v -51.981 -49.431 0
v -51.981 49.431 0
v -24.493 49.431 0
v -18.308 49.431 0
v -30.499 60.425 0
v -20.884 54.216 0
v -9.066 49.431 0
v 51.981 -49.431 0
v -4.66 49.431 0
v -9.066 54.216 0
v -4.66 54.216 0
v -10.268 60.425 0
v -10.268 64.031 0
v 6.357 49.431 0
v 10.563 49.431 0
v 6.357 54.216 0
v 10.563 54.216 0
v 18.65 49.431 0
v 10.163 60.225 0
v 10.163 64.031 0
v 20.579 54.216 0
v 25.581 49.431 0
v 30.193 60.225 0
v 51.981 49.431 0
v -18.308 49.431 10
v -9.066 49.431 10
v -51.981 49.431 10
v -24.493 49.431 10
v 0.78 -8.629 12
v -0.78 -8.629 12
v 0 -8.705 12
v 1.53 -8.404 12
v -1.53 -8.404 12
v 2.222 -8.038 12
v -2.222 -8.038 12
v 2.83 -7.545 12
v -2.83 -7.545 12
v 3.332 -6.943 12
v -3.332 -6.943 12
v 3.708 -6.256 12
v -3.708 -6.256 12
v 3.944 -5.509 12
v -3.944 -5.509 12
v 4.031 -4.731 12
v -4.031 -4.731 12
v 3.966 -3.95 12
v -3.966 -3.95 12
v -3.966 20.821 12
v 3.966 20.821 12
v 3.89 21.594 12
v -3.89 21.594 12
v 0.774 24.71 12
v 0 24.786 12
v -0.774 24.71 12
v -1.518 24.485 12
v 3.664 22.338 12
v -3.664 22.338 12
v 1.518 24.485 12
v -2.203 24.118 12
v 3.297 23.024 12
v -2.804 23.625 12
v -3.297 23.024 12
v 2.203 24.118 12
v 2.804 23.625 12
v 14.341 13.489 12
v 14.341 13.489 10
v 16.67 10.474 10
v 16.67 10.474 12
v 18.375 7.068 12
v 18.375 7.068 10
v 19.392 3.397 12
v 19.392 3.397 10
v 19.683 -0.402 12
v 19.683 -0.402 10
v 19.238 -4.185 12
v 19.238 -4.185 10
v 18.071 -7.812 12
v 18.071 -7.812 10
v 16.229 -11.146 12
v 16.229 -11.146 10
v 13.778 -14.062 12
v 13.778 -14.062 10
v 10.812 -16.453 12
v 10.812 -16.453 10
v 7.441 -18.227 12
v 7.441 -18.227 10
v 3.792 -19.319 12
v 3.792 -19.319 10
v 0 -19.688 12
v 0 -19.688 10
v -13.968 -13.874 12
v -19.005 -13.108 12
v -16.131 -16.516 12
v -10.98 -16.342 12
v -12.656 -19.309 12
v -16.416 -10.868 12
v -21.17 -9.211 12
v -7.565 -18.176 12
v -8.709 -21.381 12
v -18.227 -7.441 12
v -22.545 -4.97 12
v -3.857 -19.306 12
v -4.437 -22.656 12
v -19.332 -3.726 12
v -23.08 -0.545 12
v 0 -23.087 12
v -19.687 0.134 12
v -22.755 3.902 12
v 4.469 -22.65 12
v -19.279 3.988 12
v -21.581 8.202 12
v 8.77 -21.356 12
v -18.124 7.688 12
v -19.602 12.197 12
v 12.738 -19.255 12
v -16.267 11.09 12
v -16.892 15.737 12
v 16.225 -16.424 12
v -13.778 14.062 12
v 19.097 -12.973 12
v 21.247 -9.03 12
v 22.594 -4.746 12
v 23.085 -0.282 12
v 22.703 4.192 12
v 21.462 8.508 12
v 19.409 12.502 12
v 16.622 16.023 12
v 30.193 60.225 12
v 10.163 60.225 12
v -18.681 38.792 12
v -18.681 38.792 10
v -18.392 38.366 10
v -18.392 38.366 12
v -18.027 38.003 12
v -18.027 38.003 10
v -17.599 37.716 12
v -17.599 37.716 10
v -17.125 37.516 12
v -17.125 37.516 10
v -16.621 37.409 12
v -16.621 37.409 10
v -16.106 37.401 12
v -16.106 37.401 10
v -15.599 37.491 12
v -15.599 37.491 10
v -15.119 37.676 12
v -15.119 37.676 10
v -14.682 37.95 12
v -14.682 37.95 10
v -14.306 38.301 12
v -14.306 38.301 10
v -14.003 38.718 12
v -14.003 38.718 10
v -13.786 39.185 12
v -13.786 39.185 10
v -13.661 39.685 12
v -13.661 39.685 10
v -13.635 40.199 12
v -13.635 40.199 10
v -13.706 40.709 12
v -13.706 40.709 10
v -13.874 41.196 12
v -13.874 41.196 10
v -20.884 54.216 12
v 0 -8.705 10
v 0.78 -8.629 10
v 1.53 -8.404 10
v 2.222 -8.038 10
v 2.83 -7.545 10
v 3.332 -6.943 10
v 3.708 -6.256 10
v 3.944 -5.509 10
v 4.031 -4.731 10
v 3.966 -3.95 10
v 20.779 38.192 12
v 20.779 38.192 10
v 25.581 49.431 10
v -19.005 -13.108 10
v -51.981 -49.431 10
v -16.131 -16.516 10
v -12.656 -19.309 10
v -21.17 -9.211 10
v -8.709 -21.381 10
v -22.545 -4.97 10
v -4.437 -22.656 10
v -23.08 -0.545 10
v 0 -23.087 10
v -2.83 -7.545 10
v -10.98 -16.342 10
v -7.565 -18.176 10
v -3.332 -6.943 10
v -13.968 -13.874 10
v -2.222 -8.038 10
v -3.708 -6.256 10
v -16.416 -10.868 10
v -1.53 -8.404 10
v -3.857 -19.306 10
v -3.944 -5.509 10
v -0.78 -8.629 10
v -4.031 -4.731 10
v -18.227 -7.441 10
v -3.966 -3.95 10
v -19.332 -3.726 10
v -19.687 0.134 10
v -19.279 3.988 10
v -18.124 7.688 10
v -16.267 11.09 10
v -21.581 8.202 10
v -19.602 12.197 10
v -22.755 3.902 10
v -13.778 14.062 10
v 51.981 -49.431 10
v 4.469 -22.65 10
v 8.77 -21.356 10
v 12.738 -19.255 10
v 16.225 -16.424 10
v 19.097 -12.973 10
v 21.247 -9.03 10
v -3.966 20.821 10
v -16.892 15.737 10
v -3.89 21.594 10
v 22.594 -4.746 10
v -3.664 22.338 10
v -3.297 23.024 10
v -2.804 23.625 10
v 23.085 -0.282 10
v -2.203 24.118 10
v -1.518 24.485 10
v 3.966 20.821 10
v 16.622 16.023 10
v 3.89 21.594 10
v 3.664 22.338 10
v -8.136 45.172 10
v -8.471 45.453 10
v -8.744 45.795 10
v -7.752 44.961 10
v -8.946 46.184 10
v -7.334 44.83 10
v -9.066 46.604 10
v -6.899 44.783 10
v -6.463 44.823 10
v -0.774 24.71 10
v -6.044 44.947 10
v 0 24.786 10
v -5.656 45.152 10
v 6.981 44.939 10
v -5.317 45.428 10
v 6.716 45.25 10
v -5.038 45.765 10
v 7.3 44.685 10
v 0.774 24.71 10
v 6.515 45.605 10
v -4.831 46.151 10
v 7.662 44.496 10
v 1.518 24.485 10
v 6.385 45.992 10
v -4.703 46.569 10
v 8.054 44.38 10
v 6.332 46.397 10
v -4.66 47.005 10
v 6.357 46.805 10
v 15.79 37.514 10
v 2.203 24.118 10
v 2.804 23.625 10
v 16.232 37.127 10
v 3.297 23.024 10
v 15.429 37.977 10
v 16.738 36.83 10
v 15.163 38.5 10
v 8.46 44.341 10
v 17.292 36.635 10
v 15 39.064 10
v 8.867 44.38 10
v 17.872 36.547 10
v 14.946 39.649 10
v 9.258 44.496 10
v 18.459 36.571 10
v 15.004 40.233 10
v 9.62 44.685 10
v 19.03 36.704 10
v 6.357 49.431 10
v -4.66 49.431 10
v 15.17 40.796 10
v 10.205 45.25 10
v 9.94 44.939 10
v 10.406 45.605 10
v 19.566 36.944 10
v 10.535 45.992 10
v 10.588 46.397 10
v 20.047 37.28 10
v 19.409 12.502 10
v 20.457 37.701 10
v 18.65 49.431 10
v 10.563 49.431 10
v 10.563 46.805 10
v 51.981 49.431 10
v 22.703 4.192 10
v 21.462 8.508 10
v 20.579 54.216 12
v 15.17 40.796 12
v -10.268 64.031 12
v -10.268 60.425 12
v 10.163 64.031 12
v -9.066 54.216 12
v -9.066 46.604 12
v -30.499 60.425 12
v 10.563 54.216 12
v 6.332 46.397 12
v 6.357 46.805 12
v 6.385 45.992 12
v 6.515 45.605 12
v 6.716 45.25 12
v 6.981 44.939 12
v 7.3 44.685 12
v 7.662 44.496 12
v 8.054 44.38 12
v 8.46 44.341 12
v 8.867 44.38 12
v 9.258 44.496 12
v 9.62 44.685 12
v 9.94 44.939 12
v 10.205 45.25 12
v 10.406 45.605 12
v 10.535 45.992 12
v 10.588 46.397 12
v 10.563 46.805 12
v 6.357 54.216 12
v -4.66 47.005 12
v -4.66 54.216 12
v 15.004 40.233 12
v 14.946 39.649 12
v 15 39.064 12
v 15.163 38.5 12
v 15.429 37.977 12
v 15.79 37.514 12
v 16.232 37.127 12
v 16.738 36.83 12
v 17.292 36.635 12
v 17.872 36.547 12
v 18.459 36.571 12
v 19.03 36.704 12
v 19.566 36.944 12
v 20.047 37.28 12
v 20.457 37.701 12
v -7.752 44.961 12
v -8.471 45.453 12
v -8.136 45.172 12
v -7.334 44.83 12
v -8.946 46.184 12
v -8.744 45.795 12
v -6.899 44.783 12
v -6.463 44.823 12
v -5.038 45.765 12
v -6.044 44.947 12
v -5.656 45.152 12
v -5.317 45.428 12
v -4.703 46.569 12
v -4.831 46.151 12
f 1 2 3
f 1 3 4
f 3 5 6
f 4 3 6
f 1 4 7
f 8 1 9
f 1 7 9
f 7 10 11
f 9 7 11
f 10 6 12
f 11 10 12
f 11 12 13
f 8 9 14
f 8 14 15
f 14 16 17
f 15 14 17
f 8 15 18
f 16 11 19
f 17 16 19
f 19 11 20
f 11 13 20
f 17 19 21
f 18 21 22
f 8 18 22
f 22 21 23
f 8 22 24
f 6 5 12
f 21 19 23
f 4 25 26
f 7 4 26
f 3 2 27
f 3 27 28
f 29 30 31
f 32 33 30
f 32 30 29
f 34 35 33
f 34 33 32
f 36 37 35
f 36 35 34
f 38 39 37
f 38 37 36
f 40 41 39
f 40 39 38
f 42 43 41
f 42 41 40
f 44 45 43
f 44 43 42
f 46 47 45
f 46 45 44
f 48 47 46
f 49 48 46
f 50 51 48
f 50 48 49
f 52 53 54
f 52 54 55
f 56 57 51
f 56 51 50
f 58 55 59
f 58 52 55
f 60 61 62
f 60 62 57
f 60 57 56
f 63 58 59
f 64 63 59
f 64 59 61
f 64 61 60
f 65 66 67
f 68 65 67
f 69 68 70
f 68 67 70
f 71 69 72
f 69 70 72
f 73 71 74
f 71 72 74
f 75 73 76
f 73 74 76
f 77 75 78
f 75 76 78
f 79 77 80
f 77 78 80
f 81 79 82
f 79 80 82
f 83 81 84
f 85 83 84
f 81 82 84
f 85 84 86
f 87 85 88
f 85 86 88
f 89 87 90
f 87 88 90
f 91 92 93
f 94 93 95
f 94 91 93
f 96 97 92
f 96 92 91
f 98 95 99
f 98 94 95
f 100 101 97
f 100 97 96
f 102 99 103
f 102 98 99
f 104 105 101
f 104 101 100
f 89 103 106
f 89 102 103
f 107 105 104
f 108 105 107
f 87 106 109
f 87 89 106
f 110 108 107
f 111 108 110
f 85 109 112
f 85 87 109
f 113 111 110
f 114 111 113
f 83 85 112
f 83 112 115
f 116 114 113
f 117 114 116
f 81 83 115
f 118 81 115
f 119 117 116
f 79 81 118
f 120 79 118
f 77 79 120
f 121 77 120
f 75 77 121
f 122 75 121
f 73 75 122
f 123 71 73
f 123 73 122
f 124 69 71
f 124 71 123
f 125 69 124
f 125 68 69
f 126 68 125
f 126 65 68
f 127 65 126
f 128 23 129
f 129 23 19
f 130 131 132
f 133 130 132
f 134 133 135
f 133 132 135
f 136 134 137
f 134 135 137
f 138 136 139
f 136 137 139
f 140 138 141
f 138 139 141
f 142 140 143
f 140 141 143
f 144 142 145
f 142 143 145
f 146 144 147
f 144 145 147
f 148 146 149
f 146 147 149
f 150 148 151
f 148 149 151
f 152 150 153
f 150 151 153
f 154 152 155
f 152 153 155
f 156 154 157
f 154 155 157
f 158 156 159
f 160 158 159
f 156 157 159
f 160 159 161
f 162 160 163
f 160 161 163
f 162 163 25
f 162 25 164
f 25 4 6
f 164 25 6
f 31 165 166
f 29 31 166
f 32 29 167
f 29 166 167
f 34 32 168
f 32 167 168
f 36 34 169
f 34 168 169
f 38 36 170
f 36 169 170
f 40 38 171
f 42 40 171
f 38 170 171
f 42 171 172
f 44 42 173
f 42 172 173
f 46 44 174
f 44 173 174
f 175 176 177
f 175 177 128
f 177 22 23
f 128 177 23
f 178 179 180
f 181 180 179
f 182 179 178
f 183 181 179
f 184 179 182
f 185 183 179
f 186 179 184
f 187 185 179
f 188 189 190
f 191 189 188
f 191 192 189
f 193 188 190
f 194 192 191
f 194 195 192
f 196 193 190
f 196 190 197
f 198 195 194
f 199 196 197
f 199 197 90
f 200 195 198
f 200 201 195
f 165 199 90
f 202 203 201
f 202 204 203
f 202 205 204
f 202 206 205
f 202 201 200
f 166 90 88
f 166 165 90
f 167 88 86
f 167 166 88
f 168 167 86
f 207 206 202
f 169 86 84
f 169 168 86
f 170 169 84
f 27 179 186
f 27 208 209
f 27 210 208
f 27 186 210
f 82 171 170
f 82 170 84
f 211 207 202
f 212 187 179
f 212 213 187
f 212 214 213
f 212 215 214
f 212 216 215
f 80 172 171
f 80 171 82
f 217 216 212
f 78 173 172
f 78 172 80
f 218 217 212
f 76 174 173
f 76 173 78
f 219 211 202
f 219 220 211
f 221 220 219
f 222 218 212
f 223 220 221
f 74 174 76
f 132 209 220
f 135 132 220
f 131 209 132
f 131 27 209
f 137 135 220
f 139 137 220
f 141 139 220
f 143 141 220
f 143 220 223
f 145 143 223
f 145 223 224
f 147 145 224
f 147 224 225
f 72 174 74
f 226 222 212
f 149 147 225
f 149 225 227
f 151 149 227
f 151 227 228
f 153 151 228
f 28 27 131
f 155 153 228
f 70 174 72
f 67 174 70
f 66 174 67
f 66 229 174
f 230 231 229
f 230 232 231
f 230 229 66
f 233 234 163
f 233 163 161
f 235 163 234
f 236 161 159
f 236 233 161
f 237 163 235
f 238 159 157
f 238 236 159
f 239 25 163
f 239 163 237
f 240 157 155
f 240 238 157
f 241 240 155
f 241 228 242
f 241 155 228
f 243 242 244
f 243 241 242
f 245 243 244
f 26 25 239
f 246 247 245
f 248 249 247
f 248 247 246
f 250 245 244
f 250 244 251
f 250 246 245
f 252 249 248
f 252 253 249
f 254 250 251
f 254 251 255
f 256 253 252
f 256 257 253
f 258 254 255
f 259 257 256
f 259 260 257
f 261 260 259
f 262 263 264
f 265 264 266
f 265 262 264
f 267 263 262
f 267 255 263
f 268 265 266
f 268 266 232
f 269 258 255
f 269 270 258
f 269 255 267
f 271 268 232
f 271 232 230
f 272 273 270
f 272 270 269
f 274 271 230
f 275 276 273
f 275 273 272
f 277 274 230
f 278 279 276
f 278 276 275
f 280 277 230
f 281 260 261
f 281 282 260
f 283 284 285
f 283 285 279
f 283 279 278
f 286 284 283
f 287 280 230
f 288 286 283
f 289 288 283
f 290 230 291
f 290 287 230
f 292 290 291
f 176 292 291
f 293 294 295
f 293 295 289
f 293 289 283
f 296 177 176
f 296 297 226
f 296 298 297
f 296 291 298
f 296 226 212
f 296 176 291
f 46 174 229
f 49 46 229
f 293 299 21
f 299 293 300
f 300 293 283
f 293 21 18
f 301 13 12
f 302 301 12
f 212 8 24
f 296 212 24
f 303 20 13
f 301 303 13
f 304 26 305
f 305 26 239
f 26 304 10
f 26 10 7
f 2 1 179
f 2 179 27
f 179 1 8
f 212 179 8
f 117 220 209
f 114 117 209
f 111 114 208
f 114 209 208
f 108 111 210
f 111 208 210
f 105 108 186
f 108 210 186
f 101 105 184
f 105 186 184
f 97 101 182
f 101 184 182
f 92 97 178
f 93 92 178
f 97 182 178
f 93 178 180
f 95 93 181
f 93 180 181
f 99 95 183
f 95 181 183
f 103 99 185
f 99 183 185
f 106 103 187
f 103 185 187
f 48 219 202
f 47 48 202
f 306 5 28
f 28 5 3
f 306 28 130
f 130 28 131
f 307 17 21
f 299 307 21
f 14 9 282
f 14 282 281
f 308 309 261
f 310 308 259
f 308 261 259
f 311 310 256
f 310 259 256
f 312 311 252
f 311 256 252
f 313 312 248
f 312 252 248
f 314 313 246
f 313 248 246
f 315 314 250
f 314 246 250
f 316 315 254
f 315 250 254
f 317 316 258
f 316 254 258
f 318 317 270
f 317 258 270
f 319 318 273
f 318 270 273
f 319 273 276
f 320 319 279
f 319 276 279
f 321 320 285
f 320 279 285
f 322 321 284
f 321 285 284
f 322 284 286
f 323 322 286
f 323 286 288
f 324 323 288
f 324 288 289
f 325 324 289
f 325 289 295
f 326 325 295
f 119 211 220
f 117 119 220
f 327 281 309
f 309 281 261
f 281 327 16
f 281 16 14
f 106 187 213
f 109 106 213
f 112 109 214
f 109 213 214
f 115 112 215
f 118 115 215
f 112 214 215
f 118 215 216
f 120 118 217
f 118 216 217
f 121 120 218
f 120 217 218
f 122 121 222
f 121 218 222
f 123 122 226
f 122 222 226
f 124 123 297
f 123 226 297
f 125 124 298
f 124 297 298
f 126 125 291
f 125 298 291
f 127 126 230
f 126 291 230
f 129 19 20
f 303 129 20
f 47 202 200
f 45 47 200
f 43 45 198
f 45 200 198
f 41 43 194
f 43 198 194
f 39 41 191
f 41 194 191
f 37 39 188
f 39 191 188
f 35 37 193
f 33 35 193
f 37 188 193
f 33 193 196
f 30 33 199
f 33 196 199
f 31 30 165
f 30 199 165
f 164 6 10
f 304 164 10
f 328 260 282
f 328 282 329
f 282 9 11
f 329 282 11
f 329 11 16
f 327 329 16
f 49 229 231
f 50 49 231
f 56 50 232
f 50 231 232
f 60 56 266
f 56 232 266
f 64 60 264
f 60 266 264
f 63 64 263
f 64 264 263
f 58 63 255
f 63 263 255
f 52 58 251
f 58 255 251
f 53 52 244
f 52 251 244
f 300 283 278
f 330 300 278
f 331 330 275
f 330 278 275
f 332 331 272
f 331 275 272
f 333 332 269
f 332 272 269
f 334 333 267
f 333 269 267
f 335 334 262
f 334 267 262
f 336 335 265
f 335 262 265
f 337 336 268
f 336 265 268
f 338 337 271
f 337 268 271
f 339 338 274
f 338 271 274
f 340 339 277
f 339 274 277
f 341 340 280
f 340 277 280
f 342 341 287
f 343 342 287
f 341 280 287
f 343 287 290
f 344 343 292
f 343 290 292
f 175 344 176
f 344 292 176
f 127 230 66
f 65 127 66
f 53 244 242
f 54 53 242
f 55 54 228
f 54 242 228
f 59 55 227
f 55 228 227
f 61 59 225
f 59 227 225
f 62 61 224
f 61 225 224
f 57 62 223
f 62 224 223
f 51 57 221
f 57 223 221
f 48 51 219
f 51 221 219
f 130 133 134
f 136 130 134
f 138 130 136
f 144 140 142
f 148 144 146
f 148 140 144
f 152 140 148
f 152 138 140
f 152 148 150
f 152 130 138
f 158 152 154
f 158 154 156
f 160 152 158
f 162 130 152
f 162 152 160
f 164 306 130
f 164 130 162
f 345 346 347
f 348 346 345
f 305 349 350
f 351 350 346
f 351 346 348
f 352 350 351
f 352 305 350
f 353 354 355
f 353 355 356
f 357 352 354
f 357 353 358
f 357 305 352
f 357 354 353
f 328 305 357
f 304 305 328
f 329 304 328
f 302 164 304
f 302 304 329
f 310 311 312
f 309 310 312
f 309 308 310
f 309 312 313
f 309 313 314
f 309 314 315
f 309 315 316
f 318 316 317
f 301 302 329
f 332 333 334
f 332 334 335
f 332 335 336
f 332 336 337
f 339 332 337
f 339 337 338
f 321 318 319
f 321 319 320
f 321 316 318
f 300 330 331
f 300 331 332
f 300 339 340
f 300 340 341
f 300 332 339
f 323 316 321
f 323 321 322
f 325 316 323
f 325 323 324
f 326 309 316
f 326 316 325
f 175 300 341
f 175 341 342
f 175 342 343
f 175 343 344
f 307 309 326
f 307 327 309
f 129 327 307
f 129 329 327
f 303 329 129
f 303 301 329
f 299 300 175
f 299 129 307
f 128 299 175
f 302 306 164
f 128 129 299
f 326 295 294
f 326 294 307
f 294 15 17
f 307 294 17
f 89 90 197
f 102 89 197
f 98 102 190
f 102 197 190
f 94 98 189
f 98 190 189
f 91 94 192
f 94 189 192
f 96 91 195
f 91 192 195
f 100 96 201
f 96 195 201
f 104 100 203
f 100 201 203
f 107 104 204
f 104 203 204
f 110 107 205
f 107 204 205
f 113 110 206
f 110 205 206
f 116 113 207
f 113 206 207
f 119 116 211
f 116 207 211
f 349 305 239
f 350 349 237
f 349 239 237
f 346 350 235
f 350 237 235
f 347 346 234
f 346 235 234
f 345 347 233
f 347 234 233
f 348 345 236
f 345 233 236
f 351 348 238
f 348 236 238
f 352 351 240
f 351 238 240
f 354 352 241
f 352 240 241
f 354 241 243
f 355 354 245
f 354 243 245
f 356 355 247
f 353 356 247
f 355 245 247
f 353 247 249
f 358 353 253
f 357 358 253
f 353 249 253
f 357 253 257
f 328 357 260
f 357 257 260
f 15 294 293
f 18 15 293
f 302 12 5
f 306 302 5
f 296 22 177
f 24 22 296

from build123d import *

# Parameters (mm, degrees)
F0_W     = 103.961334
F0_H     = 98.86241
F1_DEPTH = 10
F3_DEPTH = 2
F5_DEPTH = 2
F7_DEPTH = 12


with BuildPart() as f1:
    # F0 (on Top) → F1 (new body)
    with BuildSketch(Plane.XY):
        Rectangle(F0_W, F0_H)
    extrude(amount=F1_DEPTH)

    # F2 (on face) → F3 (join)
    with BuildSketch(Plane.XY.offset(10)):
        with BuildLine():
            ThreePointArc((-16.892111, 15.737094), (-21.169771, -9.210881), (0, -23.086783))
            ThreePointArc((0, -23.086783), (21.247464, -9.030216), (16.621562, 16.022585))
            Line((16.621562, 16.022585), (14.340605, 13.488688))
            ThreePointArc((14.340605, 13.488688), (18.071472, -7.811502), (0, -19.6875))
            ThreePointArc((0, -19.6875), (-18.227079, -7.441185), (-13.778395, 14.062485))
            Line((-13.778395, 14.062485), (-16.892111, 15.737094))
        make_face()
    extrude(amount=F3_DEPTH)

    # F4 (on face) → F5 (join)
    with BuildSketch(Plane.XY.offset(10)):
        with BuildLine():
            ThreePointArc((-3.965827, -3.950249), (-3.095911, -7.256054), (0, -8.70534))
            ThreePointArc((0, -8.70534), (3.095911, -7.256054), (3.965827, -3.950249))
            Line((3.965827, -3.950249), (3.965827, 20.820595))
            ThreePointArc((3.965827, 20.820595), (2.804263, 23.624858), (0, 24.786422))
            ThreePointArc((0, 24.786422), (-2.804263, 23.624858), (-3.965827, 20.820595))
            Line((-3.965827, 20.820595), (-3.965827, -3.950249))
        make_face()
    extrude(amount=F5_DEPTH)

    # F6 (on Top) → F7 (join)
    with BuildSketch(Plane.XY):
        with BuildLine():
            Line((10.162761, 64.030863), (0, 64.030863))
            Line((0, 64.030863), (-10.268303, 64.030863))
            Line((-10.268303, 64.030863), (-10.268303, 60.425382))
            Line((-10.268303, 60.425382), (-30.499062, 60.425382))
            Line((-30.499062, 60.425382), (-18.681094, 38.792491))
            ThreePointArc((-18.681094, 38.792491), (-15.118518, 37.676481), (-13.873785, 41.196149))
            Line((-13.873785, 41.196149), (-20.884443, 54.215942))
            Line((-20.884443, 54.215942), (-9.066476, 54.215942))
            Line((-9.066476, 54.215942), (-4.659776, 54.215942))
            Line((-4.659776, 54.215942), (6.356973, 54.215942))
            Line((6.356973, 54.215942), (10.56337, 54.215942))
            Line((10.56337, 54.215942), (20.578595, 54.215942))
            Line((20.578595, 54.215942), (15.170373, 40.795539))
            ThreePointArc((15.170373, 40.795539), (16.738154, 36.83037), (20.778898, 38.191579))
            Line((20.778898, 38.191579), (30.193213, 60.225077))
            Line((30.193213, 60.225077), (10.162761, 60.225077))
            Line((10.162761, 60.225077), (10.162761, 64.030863))
        make_face()
        with BuildLine():
            Line((10.56337, 46.804674), (10.56337, 54.215942))
            Line((10.56337, 54.215942), (6.356973, 54.215942))
            Line((6.356973, 54.215942), (6.356973, 46.804674))
            ThreePointArc((6.356973, 46.804674), (8.460172, 44.341305), (10.56337, 46.804674))
        make_face()
        with BuildLine():
            Line((-4.659776, 54.215942), (-9.066476, 54.215942))
            Line((-9.066476, 54.215942), (-9.066476, 46.604369))
            ThreePointArc((-9.066476, 46.604369), (-6.680204, 44.792543), (-4.659776, 47.004979))
            Line((-4.659776, 47.004979), (-4.659776, 54.215942))
        make_face()
    extrude(amount=F7_DEPTH)


solid = f1.part
